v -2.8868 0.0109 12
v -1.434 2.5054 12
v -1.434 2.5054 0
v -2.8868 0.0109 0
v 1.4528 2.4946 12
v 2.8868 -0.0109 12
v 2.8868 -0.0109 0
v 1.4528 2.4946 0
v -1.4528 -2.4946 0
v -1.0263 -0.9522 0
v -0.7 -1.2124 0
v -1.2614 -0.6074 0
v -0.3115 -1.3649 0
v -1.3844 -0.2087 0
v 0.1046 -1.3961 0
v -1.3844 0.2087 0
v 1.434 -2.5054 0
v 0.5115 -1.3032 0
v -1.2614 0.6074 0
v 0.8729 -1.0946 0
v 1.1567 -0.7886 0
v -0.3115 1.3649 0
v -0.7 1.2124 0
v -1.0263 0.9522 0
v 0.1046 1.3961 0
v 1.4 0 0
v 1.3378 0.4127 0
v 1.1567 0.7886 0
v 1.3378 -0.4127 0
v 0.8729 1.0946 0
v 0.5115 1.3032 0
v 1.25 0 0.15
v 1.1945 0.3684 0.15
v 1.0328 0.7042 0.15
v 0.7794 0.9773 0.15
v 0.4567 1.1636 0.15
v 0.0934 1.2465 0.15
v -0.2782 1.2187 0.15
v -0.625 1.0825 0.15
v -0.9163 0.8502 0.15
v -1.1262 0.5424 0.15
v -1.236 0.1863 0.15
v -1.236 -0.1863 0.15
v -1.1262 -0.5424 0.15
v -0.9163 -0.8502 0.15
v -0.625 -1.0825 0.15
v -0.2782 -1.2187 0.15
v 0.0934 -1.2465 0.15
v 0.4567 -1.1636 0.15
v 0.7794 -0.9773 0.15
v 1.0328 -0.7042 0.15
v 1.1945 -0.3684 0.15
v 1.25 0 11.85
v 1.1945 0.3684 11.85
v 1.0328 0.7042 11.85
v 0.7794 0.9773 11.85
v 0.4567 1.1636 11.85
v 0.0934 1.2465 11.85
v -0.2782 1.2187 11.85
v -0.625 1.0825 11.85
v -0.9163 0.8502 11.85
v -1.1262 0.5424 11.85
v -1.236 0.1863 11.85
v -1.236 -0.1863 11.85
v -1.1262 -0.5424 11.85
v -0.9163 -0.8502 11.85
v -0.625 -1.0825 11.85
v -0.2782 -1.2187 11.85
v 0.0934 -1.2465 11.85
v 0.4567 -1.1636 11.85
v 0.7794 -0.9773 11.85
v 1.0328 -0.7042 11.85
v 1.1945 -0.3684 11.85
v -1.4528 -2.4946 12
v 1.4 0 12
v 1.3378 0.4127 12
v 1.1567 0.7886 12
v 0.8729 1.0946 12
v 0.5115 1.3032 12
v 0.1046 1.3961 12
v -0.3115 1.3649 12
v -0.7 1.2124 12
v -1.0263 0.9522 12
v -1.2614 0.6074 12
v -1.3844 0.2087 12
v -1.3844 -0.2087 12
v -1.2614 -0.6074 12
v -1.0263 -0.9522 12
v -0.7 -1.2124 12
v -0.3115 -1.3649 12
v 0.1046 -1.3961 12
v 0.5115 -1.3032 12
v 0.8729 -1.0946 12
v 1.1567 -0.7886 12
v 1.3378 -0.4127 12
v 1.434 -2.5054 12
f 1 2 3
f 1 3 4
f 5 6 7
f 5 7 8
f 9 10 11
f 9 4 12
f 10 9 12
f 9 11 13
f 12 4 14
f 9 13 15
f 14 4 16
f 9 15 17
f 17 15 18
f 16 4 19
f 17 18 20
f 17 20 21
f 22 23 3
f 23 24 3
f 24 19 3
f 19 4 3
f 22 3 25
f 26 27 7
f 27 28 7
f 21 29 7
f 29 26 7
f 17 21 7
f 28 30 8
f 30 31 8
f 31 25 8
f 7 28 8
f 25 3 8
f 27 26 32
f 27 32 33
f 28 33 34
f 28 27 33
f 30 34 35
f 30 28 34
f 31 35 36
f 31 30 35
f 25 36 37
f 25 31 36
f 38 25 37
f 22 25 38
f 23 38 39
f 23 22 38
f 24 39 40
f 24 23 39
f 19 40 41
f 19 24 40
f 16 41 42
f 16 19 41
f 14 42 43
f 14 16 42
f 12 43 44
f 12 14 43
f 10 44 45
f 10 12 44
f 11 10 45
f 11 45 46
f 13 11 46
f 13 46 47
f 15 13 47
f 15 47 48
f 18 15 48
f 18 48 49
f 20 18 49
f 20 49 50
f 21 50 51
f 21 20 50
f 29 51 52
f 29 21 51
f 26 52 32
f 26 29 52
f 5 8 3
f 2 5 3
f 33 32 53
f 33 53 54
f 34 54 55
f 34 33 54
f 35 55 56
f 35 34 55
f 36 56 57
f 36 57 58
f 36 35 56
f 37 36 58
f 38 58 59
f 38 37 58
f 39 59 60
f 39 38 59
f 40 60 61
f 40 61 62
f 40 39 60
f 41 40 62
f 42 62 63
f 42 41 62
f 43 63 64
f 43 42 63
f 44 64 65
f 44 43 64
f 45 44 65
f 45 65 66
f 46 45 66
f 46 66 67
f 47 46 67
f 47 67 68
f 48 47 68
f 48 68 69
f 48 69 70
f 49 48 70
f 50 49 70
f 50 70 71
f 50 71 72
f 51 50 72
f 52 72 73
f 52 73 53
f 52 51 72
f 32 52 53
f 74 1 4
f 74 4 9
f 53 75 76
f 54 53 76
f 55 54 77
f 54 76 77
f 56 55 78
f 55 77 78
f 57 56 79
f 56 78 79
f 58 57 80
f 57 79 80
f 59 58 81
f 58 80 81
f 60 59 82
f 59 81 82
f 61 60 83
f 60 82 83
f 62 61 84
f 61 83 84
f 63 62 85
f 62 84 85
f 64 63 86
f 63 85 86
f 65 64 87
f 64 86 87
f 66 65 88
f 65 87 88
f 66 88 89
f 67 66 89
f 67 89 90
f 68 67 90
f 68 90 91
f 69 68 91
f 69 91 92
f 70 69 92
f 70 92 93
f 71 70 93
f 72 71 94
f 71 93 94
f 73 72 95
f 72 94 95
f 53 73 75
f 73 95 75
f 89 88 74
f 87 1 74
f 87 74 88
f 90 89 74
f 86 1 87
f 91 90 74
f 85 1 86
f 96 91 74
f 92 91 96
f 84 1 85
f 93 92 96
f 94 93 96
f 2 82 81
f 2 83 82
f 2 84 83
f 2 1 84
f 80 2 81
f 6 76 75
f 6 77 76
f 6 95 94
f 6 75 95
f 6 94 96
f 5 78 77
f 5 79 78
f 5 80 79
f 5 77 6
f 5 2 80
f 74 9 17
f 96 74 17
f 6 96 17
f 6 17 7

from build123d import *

# Parameters (mm, degrees)
F0_R     = 1.25
F1_DEPTH = 12
F2_DEPTH = 12
F3_SIZE  = 0.15


with BuildPart() as f1:
    # F0 (on Top) → F1 (new body)
    with BuildSketch(Plane.XY):
        Polygon((1.433978, -2.505426), (2.886751, -0.010851), (1.452773, 2.494574), (-1.433978, 2.505426), (-2.886751, 0.010851), (-1.452773, -2.494574), align=None)
        Circle(F0_R, mode=Mode.SUBTRACT)
    extrude(amount=F1_DEPTH)

    # F0 (on Top) → F2 (cut)
    with BuildSketch(Plane.XY):
        Polygon((1.433978, -2.505426), (2.886751, -0.010851), (1.452773, 2.494574), (-1.433978, 2.505426), (-2.886751, 0.010851), (-1.452773, -2.494574), align=None)
        Circle(F0_R, mode=Mode.SUBTRACT)
    extrude(amount=-F2_DEPTH, mode=Mode.SUBTRACT)

    # F3
    f3_edges = [f1.edges().sort_by_distance(p)[0] for p in [
        (1.25, 0, 6),
        (-1.25, 0, 0),
        (-1.25, 0, 12),
    ]]
    chamfer(f3_edges, length=F3_SIZE)


solid = f1.part
